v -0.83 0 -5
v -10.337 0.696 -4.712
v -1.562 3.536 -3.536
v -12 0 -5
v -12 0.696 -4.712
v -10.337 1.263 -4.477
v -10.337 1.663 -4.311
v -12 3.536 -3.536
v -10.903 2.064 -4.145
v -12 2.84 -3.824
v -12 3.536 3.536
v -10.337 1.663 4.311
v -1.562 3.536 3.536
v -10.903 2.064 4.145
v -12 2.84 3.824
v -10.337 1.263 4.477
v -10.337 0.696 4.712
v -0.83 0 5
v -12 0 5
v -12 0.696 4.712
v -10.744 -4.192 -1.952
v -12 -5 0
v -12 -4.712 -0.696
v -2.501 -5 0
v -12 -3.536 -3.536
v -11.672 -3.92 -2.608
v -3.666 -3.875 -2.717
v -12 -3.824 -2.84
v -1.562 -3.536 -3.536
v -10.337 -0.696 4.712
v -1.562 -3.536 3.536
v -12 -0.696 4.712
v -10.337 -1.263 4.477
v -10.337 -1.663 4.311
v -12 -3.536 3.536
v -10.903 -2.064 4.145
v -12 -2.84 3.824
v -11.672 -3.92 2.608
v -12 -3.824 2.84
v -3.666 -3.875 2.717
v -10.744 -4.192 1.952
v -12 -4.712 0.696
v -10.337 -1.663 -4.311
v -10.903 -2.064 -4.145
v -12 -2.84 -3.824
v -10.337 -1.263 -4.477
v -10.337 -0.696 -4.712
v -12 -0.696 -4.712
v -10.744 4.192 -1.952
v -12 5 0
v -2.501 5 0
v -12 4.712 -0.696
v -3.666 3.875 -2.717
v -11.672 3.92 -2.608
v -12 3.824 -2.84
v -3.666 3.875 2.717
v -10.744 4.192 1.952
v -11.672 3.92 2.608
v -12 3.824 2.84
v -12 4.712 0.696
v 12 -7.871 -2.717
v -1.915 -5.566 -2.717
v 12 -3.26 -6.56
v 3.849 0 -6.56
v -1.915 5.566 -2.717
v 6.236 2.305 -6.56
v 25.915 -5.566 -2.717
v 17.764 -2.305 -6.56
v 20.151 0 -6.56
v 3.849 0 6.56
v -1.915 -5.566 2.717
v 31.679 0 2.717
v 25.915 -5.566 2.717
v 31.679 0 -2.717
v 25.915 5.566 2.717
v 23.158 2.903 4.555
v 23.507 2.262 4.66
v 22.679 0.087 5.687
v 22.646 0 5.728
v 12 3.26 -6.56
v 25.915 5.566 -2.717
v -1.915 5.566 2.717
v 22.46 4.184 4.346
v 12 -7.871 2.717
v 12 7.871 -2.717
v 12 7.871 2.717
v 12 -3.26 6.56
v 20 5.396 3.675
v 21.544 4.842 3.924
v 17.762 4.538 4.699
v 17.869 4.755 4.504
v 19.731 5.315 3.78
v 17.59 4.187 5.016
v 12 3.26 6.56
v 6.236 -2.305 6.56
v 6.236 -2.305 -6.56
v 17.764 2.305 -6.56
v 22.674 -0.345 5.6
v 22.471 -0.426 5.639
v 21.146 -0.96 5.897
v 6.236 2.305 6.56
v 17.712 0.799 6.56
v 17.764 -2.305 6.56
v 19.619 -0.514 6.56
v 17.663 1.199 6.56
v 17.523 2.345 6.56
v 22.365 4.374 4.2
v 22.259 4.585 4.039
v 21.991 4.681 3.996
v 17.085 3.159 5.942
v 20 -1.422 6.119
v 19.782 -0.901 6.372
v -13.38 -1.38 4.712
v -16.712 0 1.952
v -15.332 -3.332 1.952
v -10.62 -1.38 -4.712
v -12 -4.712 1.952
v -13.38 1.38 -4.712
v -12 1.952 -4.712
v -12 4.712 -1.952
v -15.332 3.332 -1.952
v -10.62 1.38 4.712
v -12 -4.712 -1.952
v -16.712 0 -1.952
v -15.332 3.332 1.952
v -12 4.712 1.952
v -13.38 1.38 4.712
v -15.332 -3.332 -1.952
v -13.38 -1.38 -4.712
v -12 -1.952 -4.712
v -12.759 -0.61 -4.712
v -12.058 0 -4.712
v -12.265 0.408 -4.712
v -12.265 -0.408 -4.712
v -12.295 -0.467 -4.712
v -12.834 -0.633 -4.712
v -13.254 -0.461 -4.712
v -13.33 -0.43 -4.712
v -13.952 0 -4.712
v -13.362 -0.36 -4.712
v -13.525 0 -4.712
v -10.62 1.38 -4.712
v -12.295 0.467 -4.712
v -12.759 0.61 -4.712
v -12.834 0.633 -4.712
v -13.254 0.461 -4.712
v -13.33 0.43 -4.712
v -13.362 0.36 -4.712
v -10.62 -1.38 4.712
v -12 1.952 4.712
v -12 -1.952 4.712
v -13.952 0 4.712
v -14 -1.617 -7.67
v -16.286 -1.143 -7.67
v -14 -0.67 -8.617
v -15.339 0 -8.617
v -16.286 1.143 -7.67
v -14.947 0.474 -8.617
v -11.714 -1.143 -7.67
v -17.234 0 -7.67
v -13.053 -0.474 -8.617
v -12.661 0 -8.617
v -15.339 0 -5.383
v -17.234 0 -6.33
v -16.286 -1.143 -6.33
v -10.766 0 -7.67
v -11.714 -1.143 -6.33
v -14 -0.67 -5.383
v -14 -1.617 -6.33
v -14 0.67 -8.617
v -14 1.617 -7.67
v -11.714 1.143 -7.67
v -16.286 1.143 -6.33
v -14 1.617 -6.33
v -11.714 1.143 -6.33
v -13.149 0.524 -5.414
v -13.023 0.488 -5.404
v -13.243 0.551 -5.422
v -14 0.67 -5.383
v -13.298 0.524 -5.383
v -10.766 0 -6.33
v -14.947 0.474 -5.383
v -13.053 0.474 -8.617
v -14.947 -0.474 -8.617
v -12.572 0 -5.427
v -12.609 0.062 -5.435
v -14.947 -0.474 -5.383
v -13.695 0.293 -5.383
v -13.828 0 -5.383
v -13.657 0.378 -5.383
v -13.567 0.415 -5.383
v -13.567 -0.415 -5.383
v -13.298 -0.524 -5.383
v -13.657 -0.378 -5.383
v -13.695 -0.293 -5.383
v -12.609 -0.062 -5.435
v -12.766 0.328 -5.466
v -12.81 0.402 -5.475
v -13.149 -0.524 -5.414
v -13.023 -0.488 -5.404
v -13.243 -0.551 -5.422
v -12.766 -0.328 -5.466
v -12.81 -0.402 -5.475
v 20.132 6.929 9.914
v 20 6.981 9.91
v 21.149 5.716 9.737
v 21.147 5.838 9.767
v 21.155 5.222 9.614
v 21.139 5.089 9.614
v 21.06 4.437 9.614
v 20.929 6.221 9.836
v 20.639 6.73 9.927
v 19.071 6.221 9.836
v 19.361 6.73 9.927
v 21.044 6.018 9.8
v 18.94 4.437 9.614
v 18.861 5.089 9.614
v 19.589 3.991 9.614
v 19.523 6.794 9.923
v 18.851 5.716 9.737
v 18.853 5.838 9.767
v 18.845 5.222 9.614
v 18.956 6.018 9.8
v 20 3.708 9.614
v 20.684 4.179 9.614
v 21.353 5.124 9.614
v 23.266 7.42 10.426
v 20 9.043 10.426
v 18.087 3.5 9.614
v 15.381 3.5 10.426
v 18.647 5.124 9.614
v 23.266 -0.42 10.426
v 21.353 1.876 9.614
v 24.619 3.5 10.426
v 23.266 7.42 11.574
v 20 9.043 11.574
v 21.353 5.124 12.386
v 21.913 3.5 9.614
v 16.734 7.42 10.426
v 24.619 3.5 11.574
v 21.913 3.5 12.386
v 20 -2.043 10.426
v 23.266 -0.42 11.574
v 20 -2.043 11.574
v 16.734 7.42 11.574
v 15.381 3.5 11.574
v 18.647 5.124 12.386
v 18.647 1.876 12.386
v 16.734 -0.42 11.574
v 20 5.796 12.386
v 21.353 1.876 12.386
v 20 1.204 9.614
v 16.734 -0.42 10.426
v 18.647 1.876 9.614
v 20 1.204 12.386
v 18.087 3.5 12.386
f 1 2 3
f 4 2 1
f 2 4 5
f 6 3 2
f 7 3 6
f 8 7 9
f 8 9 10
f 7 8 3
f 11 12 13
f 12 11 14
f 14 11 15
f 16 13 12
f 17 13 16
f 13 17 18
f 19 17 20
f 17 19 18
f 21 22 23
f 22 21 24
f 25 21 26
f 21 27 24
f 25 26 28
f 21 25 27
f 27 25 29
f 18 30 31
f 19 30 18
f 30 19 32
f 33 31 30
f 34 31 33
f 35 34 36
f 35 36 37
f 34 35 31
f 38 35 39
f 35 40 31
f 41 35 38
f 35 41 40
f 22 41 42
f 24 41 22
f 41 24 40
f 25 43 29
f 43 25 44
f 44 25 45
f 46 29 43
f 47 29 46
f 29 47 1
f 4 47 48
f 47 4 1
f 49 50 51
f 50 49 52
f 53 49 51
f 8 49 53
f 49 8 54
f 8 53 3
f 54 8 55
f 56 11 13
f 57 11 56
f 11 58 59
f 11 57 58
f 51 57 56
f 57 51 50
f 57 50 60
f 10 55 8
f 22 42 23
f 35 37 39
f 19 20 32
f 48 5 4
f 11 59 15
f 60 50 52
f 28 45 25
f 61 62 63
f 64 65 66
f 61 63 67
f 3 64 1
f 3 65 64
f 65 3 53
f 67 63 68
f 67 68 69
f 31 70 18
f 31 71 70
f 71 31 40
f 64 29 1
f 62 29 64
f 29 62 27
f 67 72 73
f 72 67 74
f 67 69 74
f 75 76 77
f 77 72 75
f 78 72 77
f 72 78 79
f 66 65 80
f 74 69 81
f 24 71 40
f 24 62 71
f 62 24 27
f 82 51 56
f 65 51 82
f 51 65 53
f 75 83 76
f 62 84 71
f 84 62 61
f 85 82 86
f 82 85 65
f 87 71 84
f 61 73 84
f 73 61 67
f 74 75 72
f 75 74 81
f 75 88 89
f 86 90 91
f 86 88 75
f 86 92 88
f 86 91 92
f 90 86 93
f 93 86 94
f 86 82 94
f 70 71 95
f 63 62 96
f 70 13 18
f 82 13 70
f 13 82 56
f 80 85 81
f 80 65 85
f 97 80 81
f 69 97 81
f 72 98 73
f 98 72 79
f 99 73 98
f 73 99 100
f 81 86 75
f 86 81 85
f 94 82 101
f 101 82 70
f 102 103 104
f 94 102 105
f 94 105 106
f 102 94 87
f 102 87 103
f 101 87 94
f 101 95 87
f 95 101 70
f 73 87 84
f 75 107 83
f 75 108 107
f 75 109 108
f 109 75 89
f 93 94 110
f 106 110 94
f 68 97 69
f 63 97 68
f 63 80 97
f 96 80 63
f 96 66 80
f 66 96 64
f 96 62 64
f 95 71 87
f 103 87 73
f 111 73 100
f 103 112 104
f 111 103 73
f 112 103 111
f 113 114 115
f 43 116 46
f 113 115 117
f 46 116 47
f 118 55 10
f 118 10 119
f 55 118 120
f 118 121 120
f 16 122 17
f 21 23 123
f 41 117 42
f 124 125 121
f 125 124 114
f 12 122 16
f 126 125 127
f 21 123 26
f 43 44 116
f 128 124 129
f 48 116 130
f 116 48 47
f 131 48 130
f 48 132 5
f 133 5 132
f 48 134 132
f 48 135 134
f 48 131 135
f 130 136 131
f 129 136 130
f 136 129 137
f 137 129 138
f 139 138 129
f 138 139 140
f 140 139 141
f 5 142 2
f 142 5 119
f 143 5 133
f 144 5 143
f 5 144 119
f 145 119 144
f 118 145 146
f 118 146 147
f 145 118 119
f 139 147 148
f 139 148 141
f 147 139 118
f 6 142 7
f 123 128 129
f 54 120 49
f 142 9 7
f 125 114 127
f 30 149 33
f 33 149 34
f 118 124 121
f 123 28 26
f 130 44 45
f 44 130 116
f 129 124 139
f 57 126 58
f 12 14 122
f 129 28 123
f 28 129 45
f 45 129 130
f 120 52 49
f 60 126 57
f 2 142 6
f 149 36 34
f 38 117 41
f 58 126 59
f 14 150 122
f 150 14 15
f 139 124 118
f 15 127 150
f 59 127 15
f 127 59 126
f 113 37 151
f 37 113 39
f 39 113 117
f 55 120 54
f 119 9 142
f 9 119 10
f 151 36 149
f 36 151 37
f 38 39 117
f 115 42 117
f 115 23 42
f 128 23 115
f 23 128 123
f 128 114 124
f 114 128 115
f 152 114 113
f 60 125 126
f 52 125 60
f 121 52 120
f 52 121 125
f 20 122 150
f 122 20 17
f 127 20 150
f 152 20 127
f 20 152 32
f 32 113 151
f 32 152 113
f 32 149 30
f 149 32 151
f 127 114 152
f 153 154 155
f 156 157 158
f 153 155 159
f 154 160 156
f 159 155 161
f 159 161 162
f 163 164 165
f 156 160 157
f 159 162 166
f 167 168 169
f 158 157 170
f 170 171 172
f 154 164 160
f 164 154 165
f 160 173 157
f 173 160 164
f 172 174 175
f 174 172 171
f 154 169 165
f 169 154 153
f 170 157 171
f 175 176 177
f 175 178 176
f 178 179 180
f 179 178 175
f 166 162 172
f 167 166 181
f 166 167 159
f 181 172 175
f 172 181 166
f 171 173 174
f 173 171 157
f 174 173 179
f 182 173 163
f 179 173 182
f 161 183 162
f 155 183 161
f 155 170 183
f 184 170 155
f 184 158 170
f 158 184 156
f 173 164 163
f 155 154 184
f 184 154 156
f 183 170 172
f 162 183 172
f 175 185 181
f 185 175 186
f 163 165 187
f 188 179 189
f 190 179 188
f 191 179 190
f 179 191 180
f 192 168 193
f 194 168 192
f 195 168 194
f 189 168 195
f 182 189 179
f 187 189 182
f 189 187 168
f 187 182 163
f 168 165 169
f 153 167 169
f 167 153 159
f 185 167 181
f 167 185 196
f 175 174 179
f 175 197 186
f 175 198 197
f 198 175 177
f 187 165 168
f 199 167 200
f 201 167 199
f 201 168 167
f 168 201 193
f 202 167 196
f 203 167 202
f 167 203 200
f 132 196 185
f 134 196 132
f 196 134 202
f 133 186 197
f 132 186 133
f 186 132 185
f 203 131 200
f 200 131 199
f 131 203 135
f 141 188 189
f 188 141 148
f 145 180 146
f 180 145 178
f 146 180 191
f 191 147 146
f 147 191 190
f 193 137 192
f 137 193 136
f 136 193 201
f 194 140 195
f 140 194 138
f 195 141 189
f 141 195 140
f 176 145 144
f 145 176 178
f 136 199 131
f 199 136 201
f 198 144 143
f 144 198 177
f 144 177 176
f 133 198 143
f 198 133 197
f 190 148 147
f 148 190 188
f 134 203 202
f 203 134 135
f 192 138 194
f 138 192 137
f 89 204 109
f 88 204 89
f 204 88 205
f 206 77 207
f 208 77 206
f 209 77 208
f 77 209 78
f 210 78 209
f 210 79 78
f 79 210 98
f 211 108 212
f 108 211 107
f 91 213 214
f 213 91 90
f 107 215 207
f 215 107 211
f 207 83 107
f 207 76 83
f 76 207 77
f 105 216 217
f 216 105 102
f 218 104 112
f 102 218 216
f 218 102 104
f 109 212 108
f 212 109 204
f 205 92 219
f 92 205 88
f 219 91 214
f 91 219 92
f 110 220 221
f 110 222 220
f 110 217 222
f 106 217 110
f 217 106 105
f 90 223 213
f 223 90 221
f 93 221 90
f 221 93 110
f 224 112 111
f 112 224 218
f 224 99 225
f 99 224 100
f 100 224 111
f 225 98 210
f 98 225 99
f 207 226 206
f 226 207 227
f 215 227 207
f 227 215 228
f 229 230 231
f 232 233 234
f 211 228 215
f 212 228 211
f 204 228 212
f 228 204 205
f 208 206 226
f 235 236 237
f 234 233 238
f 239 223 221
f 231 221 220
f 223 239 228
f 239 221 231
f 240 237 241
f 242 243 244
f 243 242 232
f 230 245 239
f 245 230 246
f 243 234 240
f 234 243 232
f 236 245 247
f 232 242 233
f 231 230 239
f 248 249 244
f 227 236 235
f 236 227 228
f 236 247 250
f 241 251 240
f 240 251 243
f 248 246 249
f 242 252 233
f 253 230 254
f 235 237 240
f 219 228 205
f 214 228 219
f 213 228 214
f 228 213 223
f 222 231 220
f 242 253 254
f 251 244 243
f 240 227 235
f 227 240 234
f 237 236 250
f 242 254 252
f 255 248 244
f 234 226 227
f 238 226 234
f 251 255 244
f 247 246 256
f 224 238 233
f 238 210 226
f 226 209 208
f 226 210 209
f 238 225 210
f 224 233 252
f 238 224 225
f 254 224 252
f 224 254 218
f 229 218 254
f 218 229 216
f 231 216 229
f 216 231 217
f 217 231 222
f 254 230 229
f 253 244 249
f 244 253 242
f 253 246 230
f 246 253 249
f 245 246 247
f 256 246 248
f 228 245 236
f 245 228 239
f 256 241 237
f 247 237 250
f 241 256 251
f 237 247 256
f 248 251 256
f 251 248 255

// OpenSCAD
module little_pod()
{
	scale(v = [1, 0.5, 0.5])
		sphere(r = 3.5);
}

module main_tank()
{
		union() {
			rotate(a = 90, v = [0, 1, 0])
				cylinder(h = 24, r1 = 5, r2 = 5, center = true);
			translate(v = [12, 0, 0])
				scale(v = [3, 1.2, 1])
				sphere(r = 7.1);
			translate(v = [-12, 0, 0])
				sphere(r = 5.1);
			translate(v = [-14, 0, 7])
				little_pod();
			translate(v = [-13, 0, 5])
				rotate(a = -30, v = [0, 1, 0])
					cylinder(h = 8, r1 = 1, r2 = 0.2, center = true);
			translate(v = [20, -2.5, -5])
				rotate(a = -35, v = [1, 0, 0])
					cylinder(h = 14, r1 = 0.7, r2 = 6, center = true);
			translate(v = [20, -3.5, -11])
				scale(v = [1, 1.2, 0.3])
					sphere(r = 5);
		}
}


$fn = 8;

rotate(a = 180, v = [1, 0, 0])
	main_tank();
